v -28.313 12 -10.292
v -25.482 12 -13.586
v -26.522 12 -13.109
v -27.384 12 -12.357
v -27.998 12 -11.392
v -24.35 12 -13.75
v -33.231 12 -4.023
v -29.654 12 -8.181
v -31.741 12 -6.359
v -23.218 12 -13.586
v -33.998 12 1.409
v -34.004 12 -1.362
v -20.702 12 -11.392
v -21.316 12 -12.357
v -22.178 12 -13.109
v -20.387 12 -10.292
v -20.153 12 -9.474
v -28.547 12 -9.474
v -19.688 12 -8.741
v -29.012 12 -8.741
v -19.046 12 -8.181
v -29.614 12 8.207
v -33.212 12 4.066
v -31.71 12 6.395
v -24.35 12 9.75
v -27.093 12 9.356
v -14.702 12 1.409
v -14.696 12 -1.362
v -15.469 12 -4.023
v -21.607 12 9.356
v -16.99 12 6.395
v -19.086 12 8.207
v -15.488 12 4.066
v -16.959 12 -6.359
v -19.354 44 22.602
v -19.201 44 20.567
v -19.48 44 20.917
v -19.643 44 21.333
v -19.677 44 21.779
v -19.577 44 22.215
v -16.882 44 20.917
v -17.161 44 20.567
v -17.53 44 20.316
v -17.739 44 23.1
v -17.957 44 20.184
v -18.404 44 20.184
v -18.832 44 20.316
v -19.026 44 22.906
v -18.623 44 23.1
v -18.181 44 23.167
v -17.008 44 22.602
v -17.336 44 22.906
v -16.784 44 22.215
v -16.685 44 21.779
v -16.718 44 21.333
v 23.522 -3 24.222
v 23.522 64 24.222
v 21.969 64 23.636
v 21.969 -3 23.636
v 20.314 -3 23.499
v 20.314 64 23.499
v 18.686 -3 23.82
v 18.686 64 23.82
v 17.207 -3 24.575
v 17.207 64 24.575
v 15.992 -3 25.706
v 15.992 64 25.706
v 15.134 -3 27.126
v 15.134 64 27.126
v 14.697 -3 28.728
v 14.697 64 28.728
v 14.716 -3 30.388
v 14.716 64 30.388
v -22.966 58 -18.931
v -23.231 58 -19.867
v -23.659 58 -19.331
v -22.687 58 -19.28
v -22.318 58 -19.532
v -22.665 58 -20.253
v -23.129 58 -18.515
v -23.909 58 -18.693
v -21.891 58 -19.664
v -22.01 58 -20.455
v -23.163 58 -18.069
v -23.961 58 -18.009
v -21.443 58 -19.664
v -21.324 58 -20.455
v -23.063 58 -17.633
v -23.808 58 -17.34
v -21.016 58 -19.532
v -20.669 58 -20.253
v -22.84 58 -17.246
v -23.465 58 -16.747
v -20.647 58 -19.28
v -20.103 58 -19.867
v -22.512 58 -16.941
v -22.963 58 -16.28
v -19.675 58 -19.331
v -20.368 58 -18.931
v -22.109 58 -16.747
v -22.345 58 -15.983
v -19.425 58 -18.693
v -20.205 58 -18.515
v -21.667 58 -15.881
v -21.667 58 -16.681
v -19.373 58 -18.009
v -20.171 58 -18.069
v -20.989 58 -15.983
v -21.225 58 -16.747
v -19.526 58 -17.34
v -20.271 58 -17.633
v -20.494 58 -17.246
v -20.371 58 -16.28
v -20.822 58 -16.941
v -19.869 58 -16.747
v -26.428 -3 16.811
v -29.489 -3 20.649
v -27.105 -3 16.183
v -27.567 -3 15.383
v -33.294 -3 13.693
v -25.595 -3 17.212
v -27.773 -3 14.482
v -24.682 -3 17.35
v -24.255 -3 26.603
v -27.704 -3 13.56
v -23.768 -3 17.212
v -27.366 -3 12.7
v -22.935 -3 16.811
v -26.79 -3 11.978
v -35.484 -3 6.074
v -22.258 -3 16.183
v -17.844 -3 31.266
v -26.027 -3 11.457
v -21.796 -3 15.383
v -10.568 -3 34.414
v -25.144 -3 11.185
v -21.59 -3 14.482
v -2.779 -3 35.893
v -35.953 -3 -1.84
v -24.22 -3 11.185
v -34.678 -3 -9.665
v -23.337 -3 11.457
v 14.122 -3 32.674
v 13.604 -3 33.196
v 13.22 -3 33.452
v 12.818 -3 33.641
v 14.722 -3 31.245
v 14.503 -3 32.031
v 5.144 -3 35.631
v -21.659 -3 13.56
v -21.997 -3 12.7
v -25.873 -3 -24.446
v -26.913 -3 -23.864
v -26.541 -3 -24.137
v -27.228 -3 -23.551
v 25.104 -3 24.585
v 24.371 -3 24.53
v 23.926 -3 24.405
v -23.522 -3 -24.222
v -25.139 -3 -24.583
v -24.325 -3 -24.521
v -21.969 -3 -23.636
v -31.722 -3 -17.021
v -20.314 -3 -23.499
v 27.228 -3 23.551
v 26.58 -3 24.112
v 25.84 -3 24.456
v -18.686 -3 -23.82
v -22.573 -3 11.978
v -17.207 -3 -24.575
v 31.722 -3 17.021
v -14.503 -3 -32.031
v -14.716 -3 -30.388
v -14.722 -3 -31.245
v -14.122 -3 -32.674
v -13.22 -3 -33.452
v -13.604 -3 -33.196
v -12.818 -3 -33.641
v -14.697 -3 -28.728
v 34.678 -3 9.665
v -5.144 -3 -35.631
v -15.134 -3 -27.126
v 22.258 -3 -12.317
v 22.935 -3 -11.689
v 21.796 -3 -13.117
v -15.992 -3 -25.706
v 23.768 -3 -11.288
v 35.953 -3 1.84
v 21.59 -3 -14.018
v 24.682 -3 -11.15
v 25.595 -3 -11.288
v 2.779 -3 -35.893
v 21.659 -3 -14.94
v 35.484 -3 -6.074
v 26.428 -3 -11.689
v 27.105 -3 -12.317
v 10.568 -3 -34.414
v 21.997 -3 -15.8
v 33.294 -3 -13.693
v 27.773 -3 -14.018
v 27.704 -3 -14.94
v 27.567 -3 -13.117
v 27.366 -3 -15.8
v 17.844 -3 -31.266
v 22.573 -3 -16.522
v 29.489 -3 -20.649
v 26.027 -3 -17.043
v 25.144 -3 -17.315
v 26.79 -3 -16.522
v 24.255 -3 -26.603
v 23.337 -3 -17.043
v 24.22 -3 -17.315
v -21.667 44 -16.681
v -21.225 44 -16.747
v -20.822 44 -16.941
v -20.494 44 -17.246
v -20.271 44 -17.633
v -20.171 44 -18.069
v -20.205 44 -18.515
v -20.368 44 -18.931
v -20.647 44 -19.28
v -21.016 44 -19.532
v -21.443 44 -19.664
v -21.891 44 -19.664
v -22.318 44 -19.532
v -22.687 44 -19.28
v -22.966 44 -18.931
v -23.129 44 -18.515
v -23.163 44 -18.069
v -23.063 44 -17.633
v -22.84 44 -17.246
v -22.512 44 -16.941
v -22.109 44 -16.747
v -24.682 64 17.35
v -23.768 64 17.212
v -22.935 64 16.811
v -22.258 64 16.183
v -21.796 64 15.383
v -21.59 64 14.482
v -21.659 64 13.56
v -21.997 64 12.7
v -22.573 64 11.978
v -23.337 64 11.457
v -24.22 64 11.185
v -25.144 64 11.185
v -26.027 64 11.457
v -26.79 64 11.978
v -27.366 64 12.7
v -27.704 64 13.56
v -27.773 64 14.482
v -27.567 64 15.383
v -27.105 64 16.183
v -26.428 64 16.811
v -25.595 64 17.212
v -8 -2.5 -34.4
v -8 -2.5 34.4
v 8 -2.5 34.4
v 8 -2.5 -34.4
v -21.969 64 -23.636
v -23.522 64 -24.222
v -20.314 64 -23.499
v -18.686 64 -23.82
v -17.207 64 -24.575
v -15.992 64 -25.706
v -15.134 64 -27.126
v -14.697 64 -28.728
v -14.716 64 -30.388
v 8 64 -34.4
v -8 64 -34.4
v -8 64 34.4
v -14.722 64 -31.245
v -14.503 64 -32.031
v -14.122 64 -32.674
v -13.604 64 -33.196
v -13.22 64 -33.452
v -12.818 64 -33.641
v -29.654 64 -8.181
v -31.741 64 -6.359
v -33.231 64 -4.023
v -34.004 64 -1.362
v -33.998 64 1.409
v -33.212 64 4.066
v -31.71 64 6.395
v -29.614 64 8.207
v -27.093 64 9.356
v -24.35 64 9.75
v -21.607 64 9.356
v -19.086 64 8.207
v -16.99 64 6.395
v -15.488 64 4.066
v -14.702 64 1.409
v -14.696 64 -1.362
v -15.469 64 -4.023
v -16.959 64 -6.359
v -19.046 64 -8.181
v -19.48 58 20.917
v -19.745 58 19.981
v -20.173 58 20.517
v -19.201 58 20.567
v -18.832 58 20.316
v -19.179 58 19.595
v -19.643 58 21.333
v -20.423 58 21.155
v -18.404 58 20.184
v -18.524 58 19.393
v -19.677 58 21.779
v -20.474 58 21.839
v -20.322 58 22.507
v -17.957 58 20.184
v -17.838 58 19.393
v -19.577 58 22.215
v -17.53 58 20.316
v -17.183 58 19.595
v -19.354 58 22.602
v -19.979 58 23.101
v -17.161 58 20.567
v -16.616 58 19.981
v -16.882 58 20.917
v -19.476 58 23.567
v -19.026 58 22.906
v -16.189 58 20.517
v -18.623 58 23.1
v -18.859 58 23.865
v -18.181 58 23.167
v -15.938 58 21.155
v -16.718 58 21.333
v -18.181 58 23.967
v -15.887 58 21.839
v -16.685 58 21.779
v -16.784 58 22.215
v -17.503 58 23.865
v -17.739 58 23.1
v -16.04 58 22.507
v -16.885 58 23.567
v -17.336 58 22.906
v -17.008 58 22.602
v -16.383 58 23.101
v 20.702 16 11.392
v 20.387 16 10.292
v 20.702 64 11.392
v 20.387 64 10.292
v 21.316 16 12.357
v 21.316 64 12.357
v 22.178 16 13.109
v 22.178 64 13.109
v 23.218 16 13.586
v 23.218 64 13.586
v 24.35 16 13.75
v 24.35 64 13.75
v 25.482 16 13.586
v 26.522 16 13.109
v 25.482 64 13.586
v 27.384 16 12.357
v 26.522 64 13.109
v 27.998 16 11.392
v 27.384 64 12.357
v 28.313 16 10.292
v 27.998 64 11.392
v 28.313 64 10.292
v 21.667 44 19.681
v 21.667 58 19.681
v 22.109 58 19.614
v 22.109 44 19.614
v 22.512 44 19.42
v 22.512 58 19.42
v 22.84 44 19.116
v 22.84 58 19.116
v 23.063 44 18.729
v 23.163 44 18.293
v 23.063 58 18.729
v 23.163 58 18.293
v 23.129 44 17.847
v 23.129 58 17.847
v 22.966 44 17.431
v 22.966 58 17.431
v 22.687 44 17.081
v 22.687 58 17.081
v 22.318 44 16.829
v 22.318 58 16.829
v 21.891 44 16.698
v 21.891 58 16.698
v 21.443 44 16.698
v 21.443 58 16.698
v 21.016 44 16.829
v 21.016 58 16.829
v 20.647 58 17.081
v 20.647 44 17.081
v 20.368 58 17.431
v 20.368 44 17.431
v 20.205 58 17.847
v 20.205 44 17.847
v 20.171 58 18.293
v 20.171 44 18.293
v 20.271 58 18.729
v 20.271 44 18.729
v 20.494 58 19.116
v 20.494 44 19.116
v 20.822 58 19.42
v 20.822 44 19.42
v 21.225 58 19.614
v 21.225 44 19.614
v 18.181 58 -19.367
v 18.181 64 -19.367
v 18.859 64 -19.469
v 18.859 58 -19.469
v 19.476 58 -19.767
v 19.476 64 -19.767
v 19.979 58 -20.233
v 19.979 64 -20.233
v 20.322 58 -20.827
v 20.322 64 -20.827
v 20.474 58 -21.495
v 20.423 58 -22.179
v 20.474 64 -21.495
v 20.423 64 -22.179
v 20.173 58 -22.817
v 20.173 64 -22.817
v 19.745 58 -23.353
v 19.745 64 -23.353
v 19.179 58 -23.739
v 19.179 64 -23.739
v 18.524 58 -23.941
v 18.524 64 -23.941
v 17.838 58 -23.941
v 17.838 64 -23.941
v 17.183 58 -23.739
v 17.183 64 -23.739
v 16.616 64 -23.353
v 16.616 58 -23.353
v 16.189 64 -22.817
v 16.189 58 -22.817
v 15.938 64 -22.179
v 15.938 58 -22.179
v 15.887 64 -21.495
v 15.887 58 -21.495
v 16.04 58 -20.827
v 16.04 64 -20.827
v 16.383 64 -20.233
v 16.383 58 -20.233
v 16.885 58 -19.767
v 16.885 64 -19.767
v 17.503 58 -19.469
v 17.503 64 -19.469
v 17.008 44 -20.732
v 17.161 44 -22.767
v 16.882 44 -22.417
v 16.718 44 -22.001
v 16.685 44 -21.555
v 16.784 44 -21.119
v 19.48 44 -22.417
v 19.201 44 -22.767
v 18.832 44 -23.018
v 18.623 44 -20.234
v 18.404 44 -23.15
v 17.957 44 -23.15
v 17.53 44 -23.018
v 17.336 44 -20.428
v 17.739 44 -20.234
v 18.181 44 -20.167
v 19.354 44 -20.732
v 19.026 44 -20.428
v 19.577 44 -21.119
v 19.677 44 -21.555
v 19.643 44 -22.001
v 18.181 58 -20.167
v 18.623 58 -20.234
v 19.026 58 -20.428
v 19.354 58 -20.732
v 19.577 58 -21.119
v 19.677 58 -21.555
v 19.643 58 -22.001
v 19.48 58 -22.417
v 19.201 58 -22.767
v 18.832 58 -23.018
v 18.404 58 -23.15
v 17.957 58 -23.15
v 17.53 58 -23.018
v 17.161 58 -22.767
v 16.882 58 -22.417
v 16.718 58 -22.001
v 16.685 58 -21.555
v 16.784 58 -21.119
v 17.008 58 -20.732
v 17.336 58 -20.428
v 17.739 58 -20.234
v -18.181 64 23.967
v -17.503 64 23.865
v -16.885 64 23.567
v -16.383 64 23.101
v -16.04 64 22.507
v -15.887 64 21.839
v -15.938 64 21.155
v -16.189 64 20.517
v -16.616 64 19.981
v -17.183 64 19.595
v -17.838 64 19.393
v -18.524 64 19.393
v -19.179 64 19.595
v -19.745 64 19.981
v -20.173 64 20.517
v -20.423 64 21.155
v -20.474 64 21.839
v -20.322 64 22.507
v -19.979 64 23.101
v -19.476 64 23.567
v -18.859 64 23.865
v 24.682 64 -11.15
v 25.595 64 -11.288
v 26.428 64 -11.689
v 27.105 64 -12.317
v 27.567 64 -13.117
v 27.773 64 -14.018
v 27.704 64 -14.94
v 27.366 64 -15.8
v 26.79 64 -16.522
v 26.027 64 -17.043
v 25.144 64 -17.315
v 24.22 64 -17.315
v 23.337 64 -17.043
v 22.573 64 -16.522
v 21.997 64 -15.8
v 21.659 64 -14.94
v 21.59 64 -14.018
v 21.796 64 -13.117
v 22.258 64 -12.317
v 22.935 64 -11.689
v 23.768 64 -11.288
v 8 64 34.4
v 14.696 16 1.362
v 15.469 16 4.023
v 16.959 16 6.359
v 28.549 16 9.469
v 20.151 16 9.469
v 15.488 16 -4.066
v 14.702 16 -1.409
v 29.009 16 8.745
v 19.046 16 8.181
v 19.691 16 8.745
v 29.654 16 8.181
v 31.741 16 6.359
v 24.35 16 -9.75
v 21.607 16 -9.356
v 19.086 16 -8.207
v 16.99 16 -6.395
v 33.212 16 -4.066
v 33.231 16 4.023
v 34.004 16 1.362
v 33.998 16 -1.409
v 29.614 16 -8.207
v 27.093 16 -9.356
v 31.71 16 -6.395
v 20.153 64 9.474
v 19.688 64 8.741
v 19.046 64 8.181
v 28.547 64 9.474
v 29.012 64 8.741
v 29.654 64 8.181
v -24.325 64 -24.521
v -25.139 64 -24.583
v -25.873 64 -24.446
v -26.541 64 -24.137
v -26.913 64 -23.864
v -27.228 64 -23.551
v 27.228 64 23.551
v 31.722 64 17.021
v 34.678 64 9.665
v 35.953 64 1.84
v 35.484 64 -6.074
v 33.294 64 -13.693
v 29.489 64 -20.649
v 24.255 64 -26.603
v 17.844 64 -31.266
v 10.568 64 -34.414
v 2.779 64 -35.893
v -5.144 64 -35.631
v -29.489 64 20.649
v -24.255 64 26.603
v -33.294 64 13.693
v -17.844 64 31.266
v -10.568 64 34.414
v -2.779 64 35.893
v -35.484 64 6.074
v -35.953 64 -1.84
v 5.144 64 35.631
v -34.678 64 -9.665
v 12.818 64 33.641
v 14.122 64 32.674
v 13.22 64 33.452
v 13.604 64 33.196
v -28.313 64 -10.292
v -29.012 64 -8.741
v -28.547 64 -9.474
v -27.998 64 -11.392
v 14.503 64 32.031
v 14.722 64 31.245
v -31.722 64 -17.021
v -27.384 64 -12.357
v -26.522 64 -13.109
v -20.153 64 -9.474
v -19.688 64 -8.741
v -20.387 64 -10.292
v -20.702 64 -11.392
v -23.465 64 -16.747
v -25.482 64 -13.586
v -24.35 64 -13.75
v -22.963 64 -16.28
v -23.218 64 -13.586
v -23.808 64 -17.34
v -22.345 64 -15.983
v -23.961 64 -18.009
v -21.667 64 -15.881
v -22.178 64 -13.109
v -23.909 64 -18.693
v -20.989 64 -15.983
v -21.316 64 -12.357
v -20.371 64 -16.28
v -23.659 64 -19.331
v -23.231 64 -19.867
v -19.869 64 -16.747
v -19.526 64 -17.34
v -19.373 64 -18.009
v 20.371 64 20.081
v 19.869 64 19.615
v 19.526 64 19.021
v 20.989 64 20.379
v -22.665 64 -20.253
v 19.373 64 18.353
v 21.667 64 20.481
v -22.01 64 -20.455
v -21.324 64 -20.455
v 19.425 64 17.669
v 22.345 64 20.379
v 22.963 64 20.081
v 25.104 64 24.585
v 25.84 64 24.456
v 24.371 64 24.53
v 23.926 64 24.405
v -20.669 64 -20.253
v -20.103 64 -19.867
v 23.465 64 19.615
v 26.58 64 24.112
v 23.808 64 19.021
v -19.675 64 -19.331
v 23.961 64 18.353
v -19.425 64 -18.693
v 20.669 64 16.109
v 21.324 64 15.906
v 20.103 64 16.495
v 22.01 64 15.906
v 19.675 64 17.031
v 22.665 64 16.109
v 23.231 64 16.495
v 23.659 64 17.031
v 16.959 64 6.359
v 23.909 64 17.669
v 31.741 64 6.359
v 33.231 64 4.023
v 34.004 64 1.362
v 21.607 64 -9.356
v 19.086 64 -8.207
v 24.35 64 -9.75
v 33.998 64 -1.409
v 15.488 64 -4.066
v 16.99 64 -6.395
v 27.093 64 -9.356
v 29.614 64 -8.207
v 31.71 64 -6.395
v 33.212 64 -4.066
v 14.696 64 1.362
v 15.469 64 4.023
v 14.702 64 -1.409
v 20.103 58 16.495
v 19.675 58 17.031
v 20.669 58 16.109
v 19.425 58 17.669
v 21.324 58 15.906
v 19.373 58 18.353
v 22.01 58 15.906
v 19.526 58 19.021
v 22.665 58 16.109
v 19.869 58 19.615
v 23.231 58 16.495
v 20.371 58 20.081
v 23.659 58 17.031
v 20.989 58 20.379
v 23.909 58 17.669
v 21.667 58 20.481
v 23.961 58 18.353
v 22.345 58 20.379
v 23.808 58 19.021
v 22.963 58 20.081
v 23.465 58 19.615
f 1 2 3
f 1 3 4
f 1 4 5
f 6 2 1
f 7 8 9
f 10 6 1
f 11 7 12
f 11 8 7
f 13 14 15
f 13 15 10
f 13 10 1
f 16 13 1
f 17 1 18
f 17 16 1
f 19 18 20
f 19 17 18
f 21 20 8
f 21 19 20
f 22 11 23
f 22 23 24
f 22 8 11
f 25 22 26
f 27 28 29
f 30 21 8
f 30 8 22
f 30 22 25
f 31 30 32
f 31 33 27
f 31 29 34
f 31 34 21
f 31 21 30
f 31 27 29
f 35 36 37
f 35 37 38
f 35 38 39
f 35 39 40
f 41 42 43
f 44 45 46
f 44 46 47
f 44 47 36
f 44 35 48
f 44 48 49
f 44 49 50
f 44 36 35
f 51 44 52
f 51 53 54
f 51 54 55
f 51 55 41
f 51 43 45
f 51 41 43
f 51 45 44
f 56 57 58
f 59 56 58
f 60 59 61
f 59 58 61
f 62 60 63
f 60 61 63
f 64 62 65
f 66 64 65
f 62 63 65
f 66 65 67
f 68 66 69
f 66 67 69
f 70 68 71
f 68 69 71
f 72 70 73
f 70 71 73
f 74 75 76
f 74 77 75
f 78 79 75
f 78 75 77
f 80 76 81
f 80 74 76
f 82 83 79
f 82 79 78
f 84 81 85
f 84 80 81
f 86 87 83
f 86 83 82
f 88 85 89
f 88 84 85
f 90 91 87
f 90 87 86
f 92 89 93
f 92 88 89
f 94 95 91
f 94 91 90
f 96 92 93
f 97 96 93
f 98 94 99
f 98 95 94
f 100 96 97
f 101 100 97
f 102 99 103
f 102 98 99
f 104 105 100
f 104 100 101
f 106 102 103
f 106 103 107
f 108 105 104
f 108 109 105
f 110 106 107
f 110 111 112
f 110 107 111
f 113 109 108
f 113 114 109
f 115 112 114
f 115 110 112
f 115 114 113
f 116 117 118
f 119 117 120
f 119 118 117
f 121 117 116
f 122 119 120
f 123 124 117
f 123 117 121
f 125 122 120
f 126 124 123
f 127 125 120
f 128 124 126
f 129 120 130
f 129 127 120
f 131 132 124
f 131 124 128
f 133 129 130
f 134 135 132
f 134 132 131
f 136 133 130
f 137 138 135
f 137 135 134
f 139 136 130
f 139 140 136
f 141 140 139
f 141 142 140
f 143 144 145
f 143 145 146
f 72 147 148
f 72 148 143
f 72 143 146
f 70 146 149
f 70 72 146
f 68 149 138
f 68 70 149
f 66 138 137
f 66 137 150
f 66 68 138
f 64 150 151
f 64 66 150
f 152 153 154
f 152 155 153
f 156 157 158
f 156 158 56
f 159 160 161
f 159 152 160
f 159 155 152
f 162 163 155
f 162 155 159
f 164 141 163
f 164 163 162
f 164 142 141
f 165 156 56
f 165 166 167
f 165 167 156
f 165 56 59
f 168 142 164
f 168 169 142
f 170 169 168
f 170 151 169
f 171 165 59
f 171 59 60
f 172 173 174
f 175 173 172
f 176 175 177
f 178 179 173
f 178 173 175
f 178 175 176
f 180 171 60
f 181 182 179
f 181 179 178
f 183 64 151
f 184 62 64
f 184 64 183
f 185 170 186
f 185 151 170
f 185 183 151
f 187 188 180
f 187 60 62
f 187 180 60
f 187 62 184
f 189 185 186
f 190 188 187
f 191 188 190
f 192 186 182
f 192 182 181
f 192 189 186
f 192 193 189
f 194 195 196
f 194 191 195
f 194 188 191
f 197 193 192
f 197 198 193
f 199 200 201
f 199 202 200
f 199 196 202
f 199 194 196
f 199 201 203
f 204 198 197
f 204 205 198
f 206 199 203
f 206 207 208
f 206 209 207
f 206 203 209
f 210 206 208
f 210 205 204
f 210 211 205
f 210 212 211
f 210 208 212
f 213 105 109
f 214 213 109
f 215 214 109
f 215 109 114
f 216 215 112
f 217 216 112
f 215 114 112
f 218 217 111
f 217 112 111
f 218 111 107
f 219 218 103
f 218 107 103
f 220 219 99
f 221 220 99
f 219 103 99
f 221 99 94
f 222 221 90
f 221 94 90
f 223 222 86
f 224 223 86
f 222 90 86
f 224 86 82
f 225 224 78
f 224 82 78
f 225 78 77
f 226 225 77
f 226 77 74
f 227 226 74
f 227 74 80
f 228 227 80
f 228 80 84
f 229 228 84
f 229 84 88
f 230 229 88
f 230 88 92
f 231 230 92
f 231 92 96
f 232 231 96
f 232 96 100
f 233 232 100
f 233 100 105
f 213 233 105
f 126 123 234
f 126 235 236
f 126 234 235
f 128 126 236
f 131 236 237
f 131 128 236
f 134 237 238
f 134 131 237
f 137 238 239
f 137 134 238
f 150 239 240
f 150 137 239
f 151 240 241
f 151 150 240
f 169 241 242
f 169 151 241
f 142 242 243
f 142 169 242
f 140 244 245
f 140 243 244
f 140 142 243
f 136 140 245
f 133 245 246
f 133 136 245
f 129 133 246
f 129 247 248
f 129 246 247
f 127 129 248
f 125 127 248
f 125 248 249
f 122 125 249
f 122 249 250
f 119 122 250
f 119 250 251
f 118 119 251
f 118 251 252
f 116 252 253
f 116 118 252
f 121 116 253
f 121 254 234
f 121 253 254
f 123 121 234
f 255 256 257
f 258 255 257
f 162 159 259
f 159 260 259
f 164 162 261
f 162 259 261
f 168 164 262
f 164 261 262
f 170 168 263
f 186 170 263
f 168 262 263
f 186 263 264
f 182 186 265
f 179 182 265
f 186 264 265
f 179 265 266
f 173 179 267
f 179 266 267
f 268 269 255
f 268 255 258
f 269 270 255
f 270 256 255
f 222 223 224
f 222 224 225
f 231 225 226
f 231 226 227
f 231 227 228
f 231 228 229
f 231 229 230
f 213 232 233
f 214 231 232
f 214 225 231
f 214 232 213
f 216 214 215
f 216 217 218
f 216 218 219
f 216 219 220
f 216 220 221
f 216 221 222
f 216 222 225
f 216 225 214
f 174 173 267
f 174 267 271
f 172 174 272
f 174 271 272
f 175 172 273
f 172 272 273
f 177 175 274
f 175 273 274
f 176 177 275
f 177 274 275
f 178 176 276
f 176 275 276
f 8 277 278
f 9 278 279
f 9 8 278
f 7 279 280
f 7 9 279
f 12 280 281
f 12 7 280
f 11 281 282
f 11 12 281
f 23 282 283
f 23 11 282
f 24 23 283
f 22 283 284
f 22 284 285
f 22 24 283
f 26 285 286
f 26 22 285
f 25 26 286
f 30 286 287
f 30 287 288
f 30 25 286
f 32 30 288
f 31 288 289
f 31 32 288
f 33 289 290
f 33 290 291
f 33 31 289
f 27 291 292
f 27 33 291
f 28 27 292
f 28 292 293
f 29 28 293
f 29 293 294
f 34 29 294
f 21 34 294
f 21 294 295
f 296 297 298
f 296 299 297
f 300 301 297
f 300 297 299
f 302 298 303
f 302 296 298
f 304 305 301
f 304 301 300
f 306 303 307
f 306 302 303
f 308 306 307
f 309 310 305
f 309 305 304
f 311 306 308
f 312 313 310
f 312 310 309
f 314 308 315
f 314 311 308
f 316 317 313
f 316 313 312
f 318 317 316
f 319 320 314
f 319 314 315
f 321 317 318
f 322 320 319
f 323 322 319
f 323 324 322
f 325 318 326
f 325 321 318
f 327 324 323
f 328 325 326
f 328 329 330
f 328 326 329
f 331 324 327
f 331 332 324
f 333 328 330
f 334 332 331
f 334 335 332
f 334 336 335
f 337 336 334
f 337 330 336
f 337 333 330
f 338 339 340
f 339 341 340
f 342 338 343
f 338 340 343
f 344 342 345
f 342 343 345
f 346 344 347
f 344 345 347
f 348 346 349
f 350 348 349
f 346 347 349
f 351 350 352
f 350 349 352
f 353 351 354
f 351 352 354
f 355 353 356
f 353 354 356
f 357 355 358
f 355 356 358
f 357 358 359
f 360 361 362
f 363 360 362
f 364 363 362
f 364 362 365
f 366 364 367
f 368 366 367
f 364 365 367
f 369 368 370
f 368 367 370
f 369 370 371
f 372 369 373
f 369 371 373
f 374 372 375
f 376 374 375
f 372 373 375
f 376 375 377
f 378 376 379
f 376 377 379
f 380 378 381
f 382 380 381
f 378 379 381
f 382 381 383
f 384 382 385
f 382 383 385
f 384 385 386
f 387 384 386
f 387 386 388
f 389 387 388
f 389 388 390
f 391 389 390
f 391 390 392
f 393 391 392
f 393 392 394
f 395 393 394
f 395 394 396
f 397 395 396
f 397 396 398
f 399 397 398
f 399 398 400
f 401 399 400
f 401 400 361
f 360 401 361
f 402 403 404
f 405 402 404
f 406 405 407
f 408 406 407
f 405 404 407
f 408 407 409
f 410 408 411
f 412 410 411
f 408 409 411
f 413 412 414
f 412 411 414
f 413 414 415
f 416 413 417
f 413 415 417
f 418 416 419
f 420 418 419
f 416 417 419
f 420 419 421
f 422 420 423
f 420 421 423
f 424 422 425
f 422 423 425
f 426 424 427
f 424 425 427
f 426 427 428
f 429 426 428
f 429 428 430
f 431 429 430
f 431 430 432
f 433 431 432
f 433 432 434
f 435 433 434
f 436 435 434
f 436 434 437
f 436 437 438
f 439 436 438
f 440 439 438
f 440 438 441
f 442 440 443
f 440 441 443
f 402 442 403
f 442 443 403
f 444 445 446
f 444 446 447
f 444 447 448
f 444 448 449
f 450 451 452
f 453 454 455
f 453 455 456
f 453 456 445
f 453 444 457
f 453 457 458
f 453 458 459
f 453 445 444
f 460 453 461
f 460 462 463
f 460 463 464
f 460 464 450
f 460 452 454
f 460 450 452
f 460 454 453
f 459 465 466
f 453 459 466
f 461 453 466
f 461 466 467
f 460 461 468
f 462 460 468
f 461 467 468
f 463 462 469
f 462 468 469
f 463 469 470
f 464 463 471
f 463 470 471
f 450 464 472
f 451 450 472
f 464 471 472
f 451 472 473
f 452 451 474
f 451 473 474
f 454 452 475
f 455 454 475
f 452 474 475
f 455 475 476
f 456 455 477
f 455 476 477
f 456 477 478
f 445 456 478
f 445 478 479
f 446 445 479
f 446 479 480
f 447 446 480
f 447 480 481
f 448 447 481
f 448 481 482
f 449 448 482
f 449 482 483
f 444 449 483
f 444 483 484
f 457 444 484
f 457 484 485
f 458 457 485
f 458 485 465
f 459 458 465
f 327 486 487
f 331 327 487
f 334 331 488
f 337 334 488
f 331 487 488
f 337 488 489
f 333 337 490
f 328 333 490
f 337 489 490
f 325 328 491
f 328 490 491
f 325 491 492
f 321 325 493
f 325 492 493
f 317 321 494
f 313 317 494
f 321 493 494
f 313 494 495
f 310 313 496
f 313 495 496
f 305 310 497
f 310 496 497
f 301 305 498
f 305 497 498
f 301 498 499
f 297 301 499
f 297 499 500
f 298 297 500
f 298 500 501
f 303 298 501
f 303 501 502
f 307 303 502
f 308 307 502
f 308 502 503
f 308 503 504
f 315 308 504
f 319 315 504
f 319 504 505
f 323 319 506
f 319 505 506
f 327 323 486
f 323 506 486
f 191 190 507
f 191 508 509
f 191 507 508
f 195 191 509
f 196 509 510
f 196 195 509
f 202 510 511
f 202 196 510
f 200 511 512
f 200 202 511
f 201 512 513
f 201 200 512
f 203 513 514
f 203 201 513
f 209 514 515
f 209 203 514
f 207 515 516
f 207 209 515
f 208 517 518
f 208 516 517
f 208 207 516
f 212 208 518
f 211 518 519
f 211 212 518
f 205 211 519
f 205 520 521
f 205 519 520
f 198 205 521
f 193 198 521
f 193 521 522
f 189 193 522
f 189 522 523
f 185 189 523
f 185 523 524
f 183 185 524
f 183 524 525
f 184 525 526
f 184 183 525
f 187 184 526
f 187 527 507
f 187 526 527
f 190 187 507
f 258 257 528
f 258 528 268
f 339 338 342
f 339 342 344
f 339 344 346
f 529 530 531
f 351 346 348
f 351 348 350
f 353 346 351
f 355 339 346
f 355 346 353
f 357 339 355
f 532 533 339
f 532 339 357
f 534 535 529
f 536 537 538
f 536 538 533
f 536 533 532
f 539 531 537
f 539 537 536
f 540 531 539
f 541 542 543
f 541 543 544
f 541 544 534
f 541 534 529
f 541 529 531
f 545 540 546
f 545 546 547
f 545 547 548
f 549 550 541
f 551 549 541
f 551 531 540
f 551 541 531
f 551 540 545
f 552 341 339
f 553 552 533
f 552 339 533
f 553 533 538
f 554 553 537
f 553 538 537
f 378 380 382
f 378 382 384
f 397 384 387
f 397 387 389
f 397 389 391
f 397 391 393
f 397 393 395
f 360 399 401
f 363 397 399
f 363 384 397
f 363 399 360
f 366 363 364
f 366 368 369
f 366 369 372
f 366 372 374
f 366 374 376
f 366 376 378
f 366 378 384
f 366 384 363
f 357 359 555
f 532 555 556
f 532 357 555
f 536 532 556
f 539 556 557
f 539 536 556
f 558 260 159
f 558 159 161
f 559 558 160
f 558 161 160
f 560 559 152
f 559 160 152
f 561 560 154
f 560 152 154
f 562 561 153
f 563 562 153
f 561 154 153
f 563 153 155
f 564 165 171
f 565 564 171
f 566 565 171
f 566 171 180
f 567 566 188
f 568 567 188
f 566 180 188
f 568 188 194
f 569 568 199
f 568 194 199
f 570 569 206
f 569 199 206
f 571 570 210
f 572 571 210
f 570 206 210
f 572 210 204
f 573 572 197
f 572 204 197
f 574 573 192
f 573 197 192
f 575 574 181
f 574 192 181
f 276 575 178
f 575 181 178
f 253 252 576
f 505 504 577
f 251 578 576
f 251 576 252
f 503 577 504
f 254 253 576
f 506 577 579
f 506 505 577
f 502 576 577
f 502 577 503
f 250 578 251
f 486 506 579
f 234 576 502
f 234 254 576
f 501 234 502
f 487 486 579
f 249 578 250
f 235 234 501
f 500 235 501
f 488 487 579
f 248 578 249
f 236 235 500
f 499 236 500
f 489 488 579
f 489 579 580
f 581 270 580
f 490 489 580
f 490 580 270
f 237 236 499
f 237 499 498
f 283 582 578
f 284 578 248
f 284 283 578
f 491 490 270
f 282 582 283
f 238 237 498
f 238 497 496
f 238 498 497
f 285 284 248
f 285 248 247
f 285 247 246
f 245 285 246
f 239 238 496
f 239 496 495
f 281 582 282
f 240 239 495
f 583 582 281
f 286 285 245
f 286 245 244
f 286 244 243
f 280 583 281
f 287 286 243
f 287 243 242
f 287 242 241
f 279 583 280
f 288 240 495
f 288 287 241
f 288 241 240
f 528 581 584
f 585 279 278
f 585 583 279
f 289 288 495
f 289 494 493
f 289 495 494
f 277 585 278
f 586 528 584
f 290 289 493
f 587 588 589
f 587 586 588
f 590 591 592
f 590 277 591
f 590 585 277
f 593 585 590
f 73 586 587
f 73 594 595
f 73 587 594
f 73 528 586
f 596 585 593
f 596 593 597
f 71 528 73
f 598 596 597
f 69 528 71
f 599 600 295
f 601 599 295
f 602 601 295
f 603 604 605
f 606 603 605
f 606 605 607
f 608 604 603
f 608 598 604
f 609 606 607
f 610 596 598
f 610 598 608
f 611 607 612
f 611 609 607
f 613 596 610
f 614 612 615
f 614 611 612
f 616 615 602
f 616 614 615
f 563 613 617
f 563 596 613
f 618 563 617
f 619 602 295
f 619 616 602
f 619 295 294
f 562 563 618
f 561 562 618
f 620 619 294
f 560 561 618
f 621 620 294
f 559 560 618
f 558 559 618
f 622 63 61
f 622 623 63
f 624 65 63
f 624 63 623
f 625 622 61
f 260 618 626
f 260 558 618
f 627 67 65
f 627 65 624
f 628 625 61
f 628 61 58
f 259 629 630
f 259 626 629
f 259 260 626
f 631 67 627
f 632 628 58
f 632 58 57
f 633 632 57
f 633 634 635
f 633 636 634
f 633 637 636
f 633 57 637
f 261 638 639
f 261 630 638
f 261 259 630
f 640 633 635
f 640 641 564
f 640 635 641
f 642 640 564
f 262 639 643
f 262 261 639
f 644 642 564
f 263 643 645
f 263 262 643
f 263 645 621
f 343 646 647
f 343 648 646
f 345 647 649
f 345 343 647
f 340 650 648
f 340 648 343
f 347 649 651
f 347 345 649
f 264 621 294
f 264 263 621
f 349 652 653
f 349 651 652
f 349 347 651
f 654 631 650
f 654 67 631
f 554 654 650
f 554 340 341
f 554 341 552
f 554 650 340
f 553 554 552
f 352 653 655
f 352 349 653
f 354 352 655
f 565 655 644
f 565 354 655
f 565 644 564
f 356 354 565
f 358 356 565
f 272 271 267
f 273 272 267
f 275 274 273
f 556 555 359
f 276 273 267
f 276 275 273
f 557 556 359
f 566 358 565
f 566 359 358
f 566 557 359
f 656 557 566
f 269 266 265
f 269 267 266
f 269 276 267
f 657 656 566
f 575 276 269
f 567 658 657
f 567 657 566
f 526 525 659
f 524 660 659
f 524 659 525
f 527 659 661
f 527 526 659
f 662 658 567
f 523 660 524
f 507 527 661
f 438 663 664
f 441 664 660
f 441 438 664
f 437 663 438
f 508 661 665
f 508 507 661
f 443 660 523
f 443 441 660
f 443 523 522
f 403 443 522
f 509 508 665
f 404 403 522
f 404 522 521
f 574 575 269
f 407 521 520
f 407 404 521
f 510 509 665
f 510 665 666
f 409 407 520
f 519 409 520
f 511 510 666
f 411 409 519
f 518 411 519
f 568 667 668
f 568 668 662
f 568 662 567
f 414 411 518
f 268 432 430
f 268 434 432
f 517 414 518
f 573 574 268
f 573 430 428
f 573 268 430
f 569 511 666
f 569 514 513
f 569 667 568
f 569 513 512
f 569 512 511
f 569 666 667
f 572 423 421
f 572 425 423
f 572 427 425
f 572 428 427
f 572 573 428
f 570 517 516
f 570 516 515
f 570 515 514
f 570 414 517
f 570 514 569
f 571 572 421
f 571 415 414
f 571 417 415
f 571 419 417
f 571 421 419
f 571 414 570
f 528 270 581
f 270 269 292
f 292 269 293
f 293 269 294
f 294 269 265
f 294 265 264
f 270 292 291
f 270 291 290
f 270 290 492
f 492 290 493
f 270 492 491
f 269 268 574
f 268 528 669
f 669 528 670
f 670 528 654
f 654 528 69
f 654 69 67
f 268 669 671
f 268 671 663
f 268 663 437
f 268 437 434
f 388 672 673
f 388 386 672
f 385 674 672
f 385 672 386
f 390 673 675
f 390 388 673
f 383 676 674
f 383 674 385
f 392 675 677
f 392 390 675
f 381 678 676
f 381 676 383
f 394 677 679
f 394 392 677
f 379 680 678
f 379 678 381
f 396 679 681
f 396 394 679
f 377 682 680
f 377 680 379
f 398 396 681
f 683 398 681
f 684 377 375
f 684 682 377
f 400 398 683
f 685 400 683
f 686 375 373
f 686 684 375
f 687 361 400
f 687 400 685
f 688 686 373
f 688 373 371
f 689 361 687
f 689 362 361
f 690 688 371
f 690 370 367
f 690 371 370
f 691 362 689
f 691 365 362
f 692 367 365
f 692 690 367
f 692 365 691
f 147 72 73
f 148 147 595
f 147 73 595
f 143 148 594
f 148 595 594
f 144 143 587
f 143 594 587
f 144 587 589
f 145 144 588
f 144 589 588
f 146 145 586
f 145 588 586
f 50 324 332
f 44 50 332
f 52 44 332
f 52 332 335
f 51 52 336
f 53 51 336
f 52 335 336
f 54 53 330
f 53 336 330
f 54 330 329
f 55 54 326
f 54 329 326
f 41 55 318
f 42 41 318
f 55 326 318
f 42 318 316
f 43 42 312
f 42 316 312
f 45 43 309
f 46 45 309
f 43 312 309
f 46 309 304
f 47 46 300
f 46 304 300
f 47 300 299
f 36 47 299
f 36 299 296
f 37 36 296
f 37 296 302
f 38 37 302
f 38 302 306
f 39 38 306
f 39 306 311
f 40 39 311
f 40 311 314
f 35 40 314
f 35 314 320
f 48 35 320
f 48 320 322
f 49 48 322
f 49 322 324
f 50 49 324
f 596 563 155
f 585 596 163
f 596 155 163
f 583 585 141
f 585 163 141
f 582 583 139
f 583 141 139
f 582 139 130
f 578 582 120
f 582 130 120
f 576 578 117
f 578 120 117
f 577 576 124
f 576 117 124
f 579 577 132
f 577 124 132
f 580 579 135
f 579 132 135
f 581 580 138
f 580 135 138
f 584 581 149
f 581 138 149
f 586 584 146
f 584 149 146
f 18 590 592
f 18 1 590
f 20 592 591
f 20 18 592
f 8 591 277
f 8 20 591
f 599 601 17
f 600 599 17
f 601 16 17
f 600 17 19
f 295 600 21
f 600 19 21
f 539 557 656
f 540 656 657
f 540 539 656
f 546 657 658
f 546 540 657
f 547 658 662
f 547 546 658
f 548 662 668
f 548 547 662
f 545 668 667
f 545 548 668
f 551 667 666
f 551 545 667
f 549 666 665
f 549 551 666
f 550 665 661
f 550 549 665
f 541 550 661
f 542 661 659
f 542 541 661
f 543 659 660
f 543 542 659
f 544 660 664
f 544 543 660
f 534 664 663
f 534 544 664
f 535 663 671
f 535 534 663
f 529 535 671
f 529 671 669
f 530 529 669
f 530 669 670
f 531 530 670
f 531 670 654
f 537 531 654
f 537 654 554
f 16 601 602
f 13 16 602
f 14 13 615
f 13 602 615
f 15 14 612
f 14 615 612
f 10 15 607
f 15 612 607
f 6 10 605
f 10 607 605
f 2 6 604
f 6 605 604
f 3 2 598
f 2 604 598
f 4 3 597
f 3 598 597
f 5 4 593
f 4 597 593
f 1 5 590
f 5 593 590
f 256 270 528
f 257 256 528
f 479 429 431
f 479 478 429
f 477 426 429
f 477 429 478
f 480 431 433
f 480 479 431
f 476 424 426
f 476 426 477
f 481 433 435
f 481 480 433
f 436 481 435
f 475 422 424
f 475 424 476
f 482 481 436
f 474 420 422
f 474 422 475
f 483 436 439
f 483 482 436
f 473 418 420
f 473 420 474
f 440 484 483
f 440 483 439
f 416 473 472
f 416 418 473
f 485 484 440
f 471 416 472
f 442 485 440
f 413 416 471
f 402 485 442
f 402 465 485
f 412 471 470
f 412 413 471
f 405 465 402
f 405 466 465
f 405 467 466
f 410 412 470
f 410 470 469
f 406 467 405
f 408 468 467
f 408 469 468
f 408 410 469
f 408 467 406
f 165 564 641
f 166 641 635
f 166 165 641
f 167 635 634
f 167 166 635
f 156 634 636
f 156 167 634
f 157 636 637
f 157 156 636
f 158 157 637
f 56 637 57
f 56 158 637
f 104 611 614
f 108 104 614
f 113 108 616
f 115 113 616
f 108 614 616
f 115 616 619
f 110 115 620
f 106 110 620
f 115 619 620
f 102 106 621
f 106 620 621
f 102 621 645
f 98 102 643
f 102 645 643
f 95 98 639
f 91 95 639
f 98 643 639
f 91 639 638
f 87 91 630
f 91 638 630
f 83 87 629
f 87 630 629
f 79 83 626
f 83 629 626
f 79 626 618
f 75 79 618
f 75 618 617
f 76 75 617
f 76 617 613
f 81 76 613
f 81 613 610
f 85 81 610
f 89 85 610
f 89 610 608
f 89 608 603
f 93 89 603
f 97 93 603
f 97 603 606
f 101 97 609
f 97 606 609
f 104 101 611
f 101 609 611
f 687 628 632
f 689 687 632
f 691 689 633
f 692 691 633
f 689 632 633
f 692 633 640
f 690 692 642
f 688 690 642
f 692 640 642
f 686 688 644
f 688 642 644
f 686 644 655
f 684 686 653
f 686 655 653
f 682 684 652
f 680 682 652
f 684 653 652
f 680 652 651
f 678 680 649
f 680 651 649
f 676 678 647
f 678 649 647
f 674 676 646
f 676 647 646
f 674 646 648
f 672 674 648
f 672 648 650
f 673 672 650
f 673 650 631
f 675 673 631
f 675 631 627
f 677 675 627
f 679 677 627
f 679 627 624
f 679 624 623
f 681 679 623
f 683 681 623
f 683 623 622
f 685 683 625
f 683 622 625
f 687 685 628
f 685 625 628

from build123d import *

# Parameters (mm, degrees)
BOSS_EXTRUDE1_OUTLINE_R   = 36
BOSS_EXTRUDE1_OUTLINE_R_2 = 9.75
BOSS_EXTRUDE1_OUTLINE_W   = 16
BOSS_EXTRUDE1_OUTLINE_H   = 68.8
BOSS_EXTRUDE1_DEPTH       = 64
BOSS_EXTRUDE2_START       = 3
SKETCH2_R                 = 36
BOSS_EXTRUDE2_DEPTH       = 3
SKETCH1_2_R               = 9.75
BOSS_EXTRUDE3_DEPTH       = 12
SKETCH4_R                 = 4
CUT_EXTRUDE1_DEPTH        = 52
SKETCH5_R                 = 1.5
CUT_EXTRUDE2_DEPTH        = 20
SKETCH5_3_R               = 2.3
SKETCH5_3_R_2             = 1.5
CUT_EXTRUDE3_DEPTH        = 6
CUT_EXTRUDE4_DEPTH        = 85.148677946
CUT_EXTRUDE4_DEPTH_BACK   = 85.148677946
SKETCH6_R                 = 3.1
CUT_EXTRUDE5_DEPTH        = 85.148677946
FILLET1_R                 = 3
CIRPATTERN1_COUNT         = 2
FILLET1_OF_CIRPATTERN1_R  = 3
BOSS_EXTRUDE4_DEPTH       = 4
SKETCH9_W                 = 16
SKETCH9_H                 = 68.8
CUT_EXTRUDE6_DEPTH        = 2.5


# Read off the part's stored shape, not the designer's step: Boss-Extrude1
with BuildPart() as part:
    # Boss-Extrude1 outline → Boss-Extrude1 (new body)
    with BuildSketch(Plane(origin=(0, 0, 0), x_dir=(1, 0, 0), z_dir=(0, 1, 0))):
        Circle(BOSS_EXTRUDE1_OUTLINE_R)
        with Locations((-24.35, 0)):
            Circle(BOSS_EXTRUDE1_OUTLINE_R_2, mode=Mode.SUBTRACT)
        Rectangle(BOSS_EXTRUDE1_OUTLINE_W, BOSS_EXTRUDE1_OUTLINE_H, mode=Mode.SUBTRACT)
        with Locations((24.35, 0)):
            Circle(BOSS_EXTRUDE1_OUTLINE_R_2, mode=Mode.SUBTRACT)
    extrude(amount=BOSS_EXTRUDE1_DEPTH)

    # Sketch2 → Boss-Extrude2 (add)
    with BuildSketch(Plane.XZ.offset(BOSS_EXTRUDE2_START)):
        with Locations(Location((0, 0, 0), (0, 0, 270))):
            Circle(SKETCH2_R)
    extrude(amount=-BOSS_EXTRUDE2_DEPTH)

    # Sketch1<2> → Boss-Extrude3 (add)
    with BuildSketch(Plane(origin=(0, 0, 0), x_dir=(1, 0, 0), z_dir=(0, 1, 0))):
        with Locations(Location((-24.35, 0, 0), (0, 0, 270))):
            Circle(SKETCH1_2_R)
        with Locations(Location((24.35, 0, 0), (0, 0, 270))):
            Circle(SKETCH1_2_R)
    extrude(amount=BOSS_EXTRUDE3_DEPTH)

    # Sketch4 → Cut-Extrude1 (cut)
    with BuildSketch(Plane(origin=(0, 64, 0), x_dir=(1, 0, 0), z_dir=(0, 1, 0))):
        with Locations((-24.35, 9.75)):
            Circle(SKETCH4_R)
        with Locations((24.35, -9.75)):
            Circle(SKETCH4_R)
    extrude(amount=-CUT_EXTRUDE1_DEPTH, mode=Mode.SUBTRACT)

    # Sketch5 → Cut-Extrude2 (cut)
    with BuildSketch(Plane(origin=(0, 64, 0), x_dir=(1, 0, 0), z_dir=(0, 1, 0))):
        with Locations(Location((-21.667008817, 18.180779107, 0), (0, 0, 270))):
            Circle(SKETCH5_R)
        with Locations(Location((18.180779107, 21.667008817, 0), (0, 0, 270))):
            Circle(SKETCH5_R)
        with Locations(Location((-18.180779107, -21.667008817, 0), (0, 0, 270))):
            Circle(SKETCH5_R)
        with Locations(Location((21.667008817, -18.180779107, 0), (0, 0, 270))):
            Circle(SKETCH5_R)
    extrude(amount=-CUT_EXTRUDE2_DEPTH, mode=Mode.SUBTRACT)

    # Sketch5<3> → Cut-Extrude3 (cut)
    # profile 1 of 4: a face of its own
    with BuildSketch(Plane(origin=(0, 64, 0), x_dir=(1, 0, 0), z_dir=(0, 1, 0))):
        with Locations(Location((-21.667008817, 18.180779107, 0), (0, 0, 270))):
            Circle(SKETCH5_3_R)
        with Locations(Location((-21.667008817, 18.180779107, 0), (0, 0, 270))):
            Circle(SKETCH5_3_R_2, mode=Mode.SUBTRACT)
    # profile 2 of 4: a face of its own
    with BuildSketch(Plane(origin=(0, 64, 0), x_dir=(1, 0, 0), z_dir=(0, 1, 0))):
        with Locations(Location((18.180779107, 21.667008817, 0), (0, 0, 270))):
            Circle(SKETCH5_3_R)
        with Locations(Location((18.180779107, 21.667008817, 0), (0, 0, 270))):
            Circle(SKETCH5_3_R_2, mode=Mode.SUBTRACT)
    # profile 3 of 4: a face of its own
    with BuildSketch(Plane(origin=(0, 64, 0), x_dir=(1, 0, 0), z_dir=(0, 1, 0))):
        with Locations(Location((21.667008817, -18.180779107, 0), (0, 0, 270))):
            Circle(SKETCH5_3_R)
        with Locations(Location((21.667008817, -18.180779107, 0), (0, 0, 270))):
            Circle(SKETCH5_3_R_2, mode=Mode.SUBTRACT)
    # profile 4 of 4: a face of its own
    with BuildSketch(Plane(origin=(0, 64, 0), x_dir=(1, 0, 0), z_dir=(0, 1, 0))):
        with Locations(Location((-18.180779107, -21.667008817, 0), (0, 0, 270))):
            Circle(SKETCH5_3_R)
        with Locations(Location((-18.180779107, -21.667008817, 0), (0, 0, 270))):
            Circle(SKETCH5_3_R_2, mode=Mode.SUBTRACT)
    extrude(amount=-CUT_EXTRUDE3_DEPTH, mode=Mode.SUBTRACT)

    # Sketch6 → Cut-Extrude4 (cut, two sides: drawn at the far end of the back side and taken through both)
    with BuildSketch(Plane(origin=(0, 64, 0), x_dir=(1, 0, 0), z_dir=(0, 1, 0)).offset(-CUT_EXTRUDE4_DEPTH_BACK)):
        with Locations(Location((-24.681724008, -14.25, 0), (0, 0, 270))):
            Circle(SKETCH6_R)
        with Locations(Location((24.681724008, 14.25, 0), (0, 0, 270))):
            Circle(SKETCH6_R)
    extrude(amount=CUT_EXTRUDE4_DEPTH + CUT_EXTRUDE4_DEPTH_BACK, mode=Mode.SUBTRACT)

    # Sketch7 → Cut-Extrude5 (cut, symmetric)
    with BuildSketch(Plane(origin=(0, 64, 0), x_dir=(1, 0, 0), z_dir=(0, 1, 0))):
        with BuildLine():
            ThreePointArc((-25.259780357, 25.650409281), (-17.207293091, 24.574561329), (-15.464146624, 32.509385863))
            ThreePointArc((-15.464146624, 32.509385863), (-20.648751709, 29.489473594), (-25.259780357, 25.650409281))
        make_face()
    cut_extrude5 = extrude(amount=CUT_EXTRUDE5_DEPTH, both=True, mode=Mode.SUBTRACT)

    # Fillet1
    fillet1_edges = [part.edges().sort_by_distance(p)[0] for p in [
        (-25.259780357, 30.5, -25.650409281),
        (-15.464146624, 30.5, -32.509385863),
        (-20.435059552, 38, -8.929487179),
        (-28.264940448, 38, -8.929487179),
        (20.435059552, 38, 8.929487179),
        (28.264940448, 38, 8.929487179),
    ]]
    fillet(fillet1_edges, radius=FILLET1_R)

    # CirPattern1: Cut-Extrude5 ×2 about axis
    cirpattern1_axis = Axis((0, 0, 0), (0, 1, 0))
    for i in range(1, CIRPATTERN1_COUNT):
        add(cut_extrude5.rotate(cirpattern1_axis, i * 360 / CIRPATTERN1_COUNT), mode=Mode.SUBTRACT)

    # Fillet1 of CirPattern1
    fillet1_of_cirpattern1_edges = [part.edges().sort_by_distance(p)[0] for p in [
        (25.259780357, 30.5, 25.650409281),
        (15.464146624, 30.5, 32.509385863),
        (20.435059552, 38, 8.929487179),
        (28.264940448, 38, 8.929487179),
        (-20.435059552, 38, -8.929487179),
        (-28.264940448, 38, -8.929487179),
    ]]
    fillet(fillet1_of_cirpattern1_edges, radius=FILLET1_OF_CIRPATTERN1_R)

    # Sketch8 → Boss-Extrude4 (add)
    with BuildSketch(Plane(origin=(0, 12, 0), x_dir=(1, 0, 0), z_dir=(0, 1, 0))):
        with BuildLine():
            ThreePointArc((20.386907649, -10.292124542), (24.35, -13.75), (28.313092351, -10.292124542))
            ThreePointArc((28.313092351, -10.292124542), (28.752934813, -9.090438977), (29.653550058, -8.181372549))
            ThreePointArc((29.653550058, -8.181372549), (24.35, 9.75), (19.046449942, -8.181372549))
            ThreePointArc((19.046449942, -8.181372549), (19.947065187, -9.090438977), (20.386907649, -10.292124542))
        make_face()
    extrude(amount=BOSS_EXTRUDE4_DEPTH)

    # Sketch9 → Cut-Extrude6 (cut)
    with BuildSketch(Plane(origin=(0, 0, 0), x_dir=(1, 0, 0), z_dir=(0, 1, 0))):
        Rectangle(SKETCH9_W, SKETCH9_H)
    extrude(amount=-CUT_EXTRUDE6_DEPTH, mode=Mode.SUBTRACT)


solid = part.part
